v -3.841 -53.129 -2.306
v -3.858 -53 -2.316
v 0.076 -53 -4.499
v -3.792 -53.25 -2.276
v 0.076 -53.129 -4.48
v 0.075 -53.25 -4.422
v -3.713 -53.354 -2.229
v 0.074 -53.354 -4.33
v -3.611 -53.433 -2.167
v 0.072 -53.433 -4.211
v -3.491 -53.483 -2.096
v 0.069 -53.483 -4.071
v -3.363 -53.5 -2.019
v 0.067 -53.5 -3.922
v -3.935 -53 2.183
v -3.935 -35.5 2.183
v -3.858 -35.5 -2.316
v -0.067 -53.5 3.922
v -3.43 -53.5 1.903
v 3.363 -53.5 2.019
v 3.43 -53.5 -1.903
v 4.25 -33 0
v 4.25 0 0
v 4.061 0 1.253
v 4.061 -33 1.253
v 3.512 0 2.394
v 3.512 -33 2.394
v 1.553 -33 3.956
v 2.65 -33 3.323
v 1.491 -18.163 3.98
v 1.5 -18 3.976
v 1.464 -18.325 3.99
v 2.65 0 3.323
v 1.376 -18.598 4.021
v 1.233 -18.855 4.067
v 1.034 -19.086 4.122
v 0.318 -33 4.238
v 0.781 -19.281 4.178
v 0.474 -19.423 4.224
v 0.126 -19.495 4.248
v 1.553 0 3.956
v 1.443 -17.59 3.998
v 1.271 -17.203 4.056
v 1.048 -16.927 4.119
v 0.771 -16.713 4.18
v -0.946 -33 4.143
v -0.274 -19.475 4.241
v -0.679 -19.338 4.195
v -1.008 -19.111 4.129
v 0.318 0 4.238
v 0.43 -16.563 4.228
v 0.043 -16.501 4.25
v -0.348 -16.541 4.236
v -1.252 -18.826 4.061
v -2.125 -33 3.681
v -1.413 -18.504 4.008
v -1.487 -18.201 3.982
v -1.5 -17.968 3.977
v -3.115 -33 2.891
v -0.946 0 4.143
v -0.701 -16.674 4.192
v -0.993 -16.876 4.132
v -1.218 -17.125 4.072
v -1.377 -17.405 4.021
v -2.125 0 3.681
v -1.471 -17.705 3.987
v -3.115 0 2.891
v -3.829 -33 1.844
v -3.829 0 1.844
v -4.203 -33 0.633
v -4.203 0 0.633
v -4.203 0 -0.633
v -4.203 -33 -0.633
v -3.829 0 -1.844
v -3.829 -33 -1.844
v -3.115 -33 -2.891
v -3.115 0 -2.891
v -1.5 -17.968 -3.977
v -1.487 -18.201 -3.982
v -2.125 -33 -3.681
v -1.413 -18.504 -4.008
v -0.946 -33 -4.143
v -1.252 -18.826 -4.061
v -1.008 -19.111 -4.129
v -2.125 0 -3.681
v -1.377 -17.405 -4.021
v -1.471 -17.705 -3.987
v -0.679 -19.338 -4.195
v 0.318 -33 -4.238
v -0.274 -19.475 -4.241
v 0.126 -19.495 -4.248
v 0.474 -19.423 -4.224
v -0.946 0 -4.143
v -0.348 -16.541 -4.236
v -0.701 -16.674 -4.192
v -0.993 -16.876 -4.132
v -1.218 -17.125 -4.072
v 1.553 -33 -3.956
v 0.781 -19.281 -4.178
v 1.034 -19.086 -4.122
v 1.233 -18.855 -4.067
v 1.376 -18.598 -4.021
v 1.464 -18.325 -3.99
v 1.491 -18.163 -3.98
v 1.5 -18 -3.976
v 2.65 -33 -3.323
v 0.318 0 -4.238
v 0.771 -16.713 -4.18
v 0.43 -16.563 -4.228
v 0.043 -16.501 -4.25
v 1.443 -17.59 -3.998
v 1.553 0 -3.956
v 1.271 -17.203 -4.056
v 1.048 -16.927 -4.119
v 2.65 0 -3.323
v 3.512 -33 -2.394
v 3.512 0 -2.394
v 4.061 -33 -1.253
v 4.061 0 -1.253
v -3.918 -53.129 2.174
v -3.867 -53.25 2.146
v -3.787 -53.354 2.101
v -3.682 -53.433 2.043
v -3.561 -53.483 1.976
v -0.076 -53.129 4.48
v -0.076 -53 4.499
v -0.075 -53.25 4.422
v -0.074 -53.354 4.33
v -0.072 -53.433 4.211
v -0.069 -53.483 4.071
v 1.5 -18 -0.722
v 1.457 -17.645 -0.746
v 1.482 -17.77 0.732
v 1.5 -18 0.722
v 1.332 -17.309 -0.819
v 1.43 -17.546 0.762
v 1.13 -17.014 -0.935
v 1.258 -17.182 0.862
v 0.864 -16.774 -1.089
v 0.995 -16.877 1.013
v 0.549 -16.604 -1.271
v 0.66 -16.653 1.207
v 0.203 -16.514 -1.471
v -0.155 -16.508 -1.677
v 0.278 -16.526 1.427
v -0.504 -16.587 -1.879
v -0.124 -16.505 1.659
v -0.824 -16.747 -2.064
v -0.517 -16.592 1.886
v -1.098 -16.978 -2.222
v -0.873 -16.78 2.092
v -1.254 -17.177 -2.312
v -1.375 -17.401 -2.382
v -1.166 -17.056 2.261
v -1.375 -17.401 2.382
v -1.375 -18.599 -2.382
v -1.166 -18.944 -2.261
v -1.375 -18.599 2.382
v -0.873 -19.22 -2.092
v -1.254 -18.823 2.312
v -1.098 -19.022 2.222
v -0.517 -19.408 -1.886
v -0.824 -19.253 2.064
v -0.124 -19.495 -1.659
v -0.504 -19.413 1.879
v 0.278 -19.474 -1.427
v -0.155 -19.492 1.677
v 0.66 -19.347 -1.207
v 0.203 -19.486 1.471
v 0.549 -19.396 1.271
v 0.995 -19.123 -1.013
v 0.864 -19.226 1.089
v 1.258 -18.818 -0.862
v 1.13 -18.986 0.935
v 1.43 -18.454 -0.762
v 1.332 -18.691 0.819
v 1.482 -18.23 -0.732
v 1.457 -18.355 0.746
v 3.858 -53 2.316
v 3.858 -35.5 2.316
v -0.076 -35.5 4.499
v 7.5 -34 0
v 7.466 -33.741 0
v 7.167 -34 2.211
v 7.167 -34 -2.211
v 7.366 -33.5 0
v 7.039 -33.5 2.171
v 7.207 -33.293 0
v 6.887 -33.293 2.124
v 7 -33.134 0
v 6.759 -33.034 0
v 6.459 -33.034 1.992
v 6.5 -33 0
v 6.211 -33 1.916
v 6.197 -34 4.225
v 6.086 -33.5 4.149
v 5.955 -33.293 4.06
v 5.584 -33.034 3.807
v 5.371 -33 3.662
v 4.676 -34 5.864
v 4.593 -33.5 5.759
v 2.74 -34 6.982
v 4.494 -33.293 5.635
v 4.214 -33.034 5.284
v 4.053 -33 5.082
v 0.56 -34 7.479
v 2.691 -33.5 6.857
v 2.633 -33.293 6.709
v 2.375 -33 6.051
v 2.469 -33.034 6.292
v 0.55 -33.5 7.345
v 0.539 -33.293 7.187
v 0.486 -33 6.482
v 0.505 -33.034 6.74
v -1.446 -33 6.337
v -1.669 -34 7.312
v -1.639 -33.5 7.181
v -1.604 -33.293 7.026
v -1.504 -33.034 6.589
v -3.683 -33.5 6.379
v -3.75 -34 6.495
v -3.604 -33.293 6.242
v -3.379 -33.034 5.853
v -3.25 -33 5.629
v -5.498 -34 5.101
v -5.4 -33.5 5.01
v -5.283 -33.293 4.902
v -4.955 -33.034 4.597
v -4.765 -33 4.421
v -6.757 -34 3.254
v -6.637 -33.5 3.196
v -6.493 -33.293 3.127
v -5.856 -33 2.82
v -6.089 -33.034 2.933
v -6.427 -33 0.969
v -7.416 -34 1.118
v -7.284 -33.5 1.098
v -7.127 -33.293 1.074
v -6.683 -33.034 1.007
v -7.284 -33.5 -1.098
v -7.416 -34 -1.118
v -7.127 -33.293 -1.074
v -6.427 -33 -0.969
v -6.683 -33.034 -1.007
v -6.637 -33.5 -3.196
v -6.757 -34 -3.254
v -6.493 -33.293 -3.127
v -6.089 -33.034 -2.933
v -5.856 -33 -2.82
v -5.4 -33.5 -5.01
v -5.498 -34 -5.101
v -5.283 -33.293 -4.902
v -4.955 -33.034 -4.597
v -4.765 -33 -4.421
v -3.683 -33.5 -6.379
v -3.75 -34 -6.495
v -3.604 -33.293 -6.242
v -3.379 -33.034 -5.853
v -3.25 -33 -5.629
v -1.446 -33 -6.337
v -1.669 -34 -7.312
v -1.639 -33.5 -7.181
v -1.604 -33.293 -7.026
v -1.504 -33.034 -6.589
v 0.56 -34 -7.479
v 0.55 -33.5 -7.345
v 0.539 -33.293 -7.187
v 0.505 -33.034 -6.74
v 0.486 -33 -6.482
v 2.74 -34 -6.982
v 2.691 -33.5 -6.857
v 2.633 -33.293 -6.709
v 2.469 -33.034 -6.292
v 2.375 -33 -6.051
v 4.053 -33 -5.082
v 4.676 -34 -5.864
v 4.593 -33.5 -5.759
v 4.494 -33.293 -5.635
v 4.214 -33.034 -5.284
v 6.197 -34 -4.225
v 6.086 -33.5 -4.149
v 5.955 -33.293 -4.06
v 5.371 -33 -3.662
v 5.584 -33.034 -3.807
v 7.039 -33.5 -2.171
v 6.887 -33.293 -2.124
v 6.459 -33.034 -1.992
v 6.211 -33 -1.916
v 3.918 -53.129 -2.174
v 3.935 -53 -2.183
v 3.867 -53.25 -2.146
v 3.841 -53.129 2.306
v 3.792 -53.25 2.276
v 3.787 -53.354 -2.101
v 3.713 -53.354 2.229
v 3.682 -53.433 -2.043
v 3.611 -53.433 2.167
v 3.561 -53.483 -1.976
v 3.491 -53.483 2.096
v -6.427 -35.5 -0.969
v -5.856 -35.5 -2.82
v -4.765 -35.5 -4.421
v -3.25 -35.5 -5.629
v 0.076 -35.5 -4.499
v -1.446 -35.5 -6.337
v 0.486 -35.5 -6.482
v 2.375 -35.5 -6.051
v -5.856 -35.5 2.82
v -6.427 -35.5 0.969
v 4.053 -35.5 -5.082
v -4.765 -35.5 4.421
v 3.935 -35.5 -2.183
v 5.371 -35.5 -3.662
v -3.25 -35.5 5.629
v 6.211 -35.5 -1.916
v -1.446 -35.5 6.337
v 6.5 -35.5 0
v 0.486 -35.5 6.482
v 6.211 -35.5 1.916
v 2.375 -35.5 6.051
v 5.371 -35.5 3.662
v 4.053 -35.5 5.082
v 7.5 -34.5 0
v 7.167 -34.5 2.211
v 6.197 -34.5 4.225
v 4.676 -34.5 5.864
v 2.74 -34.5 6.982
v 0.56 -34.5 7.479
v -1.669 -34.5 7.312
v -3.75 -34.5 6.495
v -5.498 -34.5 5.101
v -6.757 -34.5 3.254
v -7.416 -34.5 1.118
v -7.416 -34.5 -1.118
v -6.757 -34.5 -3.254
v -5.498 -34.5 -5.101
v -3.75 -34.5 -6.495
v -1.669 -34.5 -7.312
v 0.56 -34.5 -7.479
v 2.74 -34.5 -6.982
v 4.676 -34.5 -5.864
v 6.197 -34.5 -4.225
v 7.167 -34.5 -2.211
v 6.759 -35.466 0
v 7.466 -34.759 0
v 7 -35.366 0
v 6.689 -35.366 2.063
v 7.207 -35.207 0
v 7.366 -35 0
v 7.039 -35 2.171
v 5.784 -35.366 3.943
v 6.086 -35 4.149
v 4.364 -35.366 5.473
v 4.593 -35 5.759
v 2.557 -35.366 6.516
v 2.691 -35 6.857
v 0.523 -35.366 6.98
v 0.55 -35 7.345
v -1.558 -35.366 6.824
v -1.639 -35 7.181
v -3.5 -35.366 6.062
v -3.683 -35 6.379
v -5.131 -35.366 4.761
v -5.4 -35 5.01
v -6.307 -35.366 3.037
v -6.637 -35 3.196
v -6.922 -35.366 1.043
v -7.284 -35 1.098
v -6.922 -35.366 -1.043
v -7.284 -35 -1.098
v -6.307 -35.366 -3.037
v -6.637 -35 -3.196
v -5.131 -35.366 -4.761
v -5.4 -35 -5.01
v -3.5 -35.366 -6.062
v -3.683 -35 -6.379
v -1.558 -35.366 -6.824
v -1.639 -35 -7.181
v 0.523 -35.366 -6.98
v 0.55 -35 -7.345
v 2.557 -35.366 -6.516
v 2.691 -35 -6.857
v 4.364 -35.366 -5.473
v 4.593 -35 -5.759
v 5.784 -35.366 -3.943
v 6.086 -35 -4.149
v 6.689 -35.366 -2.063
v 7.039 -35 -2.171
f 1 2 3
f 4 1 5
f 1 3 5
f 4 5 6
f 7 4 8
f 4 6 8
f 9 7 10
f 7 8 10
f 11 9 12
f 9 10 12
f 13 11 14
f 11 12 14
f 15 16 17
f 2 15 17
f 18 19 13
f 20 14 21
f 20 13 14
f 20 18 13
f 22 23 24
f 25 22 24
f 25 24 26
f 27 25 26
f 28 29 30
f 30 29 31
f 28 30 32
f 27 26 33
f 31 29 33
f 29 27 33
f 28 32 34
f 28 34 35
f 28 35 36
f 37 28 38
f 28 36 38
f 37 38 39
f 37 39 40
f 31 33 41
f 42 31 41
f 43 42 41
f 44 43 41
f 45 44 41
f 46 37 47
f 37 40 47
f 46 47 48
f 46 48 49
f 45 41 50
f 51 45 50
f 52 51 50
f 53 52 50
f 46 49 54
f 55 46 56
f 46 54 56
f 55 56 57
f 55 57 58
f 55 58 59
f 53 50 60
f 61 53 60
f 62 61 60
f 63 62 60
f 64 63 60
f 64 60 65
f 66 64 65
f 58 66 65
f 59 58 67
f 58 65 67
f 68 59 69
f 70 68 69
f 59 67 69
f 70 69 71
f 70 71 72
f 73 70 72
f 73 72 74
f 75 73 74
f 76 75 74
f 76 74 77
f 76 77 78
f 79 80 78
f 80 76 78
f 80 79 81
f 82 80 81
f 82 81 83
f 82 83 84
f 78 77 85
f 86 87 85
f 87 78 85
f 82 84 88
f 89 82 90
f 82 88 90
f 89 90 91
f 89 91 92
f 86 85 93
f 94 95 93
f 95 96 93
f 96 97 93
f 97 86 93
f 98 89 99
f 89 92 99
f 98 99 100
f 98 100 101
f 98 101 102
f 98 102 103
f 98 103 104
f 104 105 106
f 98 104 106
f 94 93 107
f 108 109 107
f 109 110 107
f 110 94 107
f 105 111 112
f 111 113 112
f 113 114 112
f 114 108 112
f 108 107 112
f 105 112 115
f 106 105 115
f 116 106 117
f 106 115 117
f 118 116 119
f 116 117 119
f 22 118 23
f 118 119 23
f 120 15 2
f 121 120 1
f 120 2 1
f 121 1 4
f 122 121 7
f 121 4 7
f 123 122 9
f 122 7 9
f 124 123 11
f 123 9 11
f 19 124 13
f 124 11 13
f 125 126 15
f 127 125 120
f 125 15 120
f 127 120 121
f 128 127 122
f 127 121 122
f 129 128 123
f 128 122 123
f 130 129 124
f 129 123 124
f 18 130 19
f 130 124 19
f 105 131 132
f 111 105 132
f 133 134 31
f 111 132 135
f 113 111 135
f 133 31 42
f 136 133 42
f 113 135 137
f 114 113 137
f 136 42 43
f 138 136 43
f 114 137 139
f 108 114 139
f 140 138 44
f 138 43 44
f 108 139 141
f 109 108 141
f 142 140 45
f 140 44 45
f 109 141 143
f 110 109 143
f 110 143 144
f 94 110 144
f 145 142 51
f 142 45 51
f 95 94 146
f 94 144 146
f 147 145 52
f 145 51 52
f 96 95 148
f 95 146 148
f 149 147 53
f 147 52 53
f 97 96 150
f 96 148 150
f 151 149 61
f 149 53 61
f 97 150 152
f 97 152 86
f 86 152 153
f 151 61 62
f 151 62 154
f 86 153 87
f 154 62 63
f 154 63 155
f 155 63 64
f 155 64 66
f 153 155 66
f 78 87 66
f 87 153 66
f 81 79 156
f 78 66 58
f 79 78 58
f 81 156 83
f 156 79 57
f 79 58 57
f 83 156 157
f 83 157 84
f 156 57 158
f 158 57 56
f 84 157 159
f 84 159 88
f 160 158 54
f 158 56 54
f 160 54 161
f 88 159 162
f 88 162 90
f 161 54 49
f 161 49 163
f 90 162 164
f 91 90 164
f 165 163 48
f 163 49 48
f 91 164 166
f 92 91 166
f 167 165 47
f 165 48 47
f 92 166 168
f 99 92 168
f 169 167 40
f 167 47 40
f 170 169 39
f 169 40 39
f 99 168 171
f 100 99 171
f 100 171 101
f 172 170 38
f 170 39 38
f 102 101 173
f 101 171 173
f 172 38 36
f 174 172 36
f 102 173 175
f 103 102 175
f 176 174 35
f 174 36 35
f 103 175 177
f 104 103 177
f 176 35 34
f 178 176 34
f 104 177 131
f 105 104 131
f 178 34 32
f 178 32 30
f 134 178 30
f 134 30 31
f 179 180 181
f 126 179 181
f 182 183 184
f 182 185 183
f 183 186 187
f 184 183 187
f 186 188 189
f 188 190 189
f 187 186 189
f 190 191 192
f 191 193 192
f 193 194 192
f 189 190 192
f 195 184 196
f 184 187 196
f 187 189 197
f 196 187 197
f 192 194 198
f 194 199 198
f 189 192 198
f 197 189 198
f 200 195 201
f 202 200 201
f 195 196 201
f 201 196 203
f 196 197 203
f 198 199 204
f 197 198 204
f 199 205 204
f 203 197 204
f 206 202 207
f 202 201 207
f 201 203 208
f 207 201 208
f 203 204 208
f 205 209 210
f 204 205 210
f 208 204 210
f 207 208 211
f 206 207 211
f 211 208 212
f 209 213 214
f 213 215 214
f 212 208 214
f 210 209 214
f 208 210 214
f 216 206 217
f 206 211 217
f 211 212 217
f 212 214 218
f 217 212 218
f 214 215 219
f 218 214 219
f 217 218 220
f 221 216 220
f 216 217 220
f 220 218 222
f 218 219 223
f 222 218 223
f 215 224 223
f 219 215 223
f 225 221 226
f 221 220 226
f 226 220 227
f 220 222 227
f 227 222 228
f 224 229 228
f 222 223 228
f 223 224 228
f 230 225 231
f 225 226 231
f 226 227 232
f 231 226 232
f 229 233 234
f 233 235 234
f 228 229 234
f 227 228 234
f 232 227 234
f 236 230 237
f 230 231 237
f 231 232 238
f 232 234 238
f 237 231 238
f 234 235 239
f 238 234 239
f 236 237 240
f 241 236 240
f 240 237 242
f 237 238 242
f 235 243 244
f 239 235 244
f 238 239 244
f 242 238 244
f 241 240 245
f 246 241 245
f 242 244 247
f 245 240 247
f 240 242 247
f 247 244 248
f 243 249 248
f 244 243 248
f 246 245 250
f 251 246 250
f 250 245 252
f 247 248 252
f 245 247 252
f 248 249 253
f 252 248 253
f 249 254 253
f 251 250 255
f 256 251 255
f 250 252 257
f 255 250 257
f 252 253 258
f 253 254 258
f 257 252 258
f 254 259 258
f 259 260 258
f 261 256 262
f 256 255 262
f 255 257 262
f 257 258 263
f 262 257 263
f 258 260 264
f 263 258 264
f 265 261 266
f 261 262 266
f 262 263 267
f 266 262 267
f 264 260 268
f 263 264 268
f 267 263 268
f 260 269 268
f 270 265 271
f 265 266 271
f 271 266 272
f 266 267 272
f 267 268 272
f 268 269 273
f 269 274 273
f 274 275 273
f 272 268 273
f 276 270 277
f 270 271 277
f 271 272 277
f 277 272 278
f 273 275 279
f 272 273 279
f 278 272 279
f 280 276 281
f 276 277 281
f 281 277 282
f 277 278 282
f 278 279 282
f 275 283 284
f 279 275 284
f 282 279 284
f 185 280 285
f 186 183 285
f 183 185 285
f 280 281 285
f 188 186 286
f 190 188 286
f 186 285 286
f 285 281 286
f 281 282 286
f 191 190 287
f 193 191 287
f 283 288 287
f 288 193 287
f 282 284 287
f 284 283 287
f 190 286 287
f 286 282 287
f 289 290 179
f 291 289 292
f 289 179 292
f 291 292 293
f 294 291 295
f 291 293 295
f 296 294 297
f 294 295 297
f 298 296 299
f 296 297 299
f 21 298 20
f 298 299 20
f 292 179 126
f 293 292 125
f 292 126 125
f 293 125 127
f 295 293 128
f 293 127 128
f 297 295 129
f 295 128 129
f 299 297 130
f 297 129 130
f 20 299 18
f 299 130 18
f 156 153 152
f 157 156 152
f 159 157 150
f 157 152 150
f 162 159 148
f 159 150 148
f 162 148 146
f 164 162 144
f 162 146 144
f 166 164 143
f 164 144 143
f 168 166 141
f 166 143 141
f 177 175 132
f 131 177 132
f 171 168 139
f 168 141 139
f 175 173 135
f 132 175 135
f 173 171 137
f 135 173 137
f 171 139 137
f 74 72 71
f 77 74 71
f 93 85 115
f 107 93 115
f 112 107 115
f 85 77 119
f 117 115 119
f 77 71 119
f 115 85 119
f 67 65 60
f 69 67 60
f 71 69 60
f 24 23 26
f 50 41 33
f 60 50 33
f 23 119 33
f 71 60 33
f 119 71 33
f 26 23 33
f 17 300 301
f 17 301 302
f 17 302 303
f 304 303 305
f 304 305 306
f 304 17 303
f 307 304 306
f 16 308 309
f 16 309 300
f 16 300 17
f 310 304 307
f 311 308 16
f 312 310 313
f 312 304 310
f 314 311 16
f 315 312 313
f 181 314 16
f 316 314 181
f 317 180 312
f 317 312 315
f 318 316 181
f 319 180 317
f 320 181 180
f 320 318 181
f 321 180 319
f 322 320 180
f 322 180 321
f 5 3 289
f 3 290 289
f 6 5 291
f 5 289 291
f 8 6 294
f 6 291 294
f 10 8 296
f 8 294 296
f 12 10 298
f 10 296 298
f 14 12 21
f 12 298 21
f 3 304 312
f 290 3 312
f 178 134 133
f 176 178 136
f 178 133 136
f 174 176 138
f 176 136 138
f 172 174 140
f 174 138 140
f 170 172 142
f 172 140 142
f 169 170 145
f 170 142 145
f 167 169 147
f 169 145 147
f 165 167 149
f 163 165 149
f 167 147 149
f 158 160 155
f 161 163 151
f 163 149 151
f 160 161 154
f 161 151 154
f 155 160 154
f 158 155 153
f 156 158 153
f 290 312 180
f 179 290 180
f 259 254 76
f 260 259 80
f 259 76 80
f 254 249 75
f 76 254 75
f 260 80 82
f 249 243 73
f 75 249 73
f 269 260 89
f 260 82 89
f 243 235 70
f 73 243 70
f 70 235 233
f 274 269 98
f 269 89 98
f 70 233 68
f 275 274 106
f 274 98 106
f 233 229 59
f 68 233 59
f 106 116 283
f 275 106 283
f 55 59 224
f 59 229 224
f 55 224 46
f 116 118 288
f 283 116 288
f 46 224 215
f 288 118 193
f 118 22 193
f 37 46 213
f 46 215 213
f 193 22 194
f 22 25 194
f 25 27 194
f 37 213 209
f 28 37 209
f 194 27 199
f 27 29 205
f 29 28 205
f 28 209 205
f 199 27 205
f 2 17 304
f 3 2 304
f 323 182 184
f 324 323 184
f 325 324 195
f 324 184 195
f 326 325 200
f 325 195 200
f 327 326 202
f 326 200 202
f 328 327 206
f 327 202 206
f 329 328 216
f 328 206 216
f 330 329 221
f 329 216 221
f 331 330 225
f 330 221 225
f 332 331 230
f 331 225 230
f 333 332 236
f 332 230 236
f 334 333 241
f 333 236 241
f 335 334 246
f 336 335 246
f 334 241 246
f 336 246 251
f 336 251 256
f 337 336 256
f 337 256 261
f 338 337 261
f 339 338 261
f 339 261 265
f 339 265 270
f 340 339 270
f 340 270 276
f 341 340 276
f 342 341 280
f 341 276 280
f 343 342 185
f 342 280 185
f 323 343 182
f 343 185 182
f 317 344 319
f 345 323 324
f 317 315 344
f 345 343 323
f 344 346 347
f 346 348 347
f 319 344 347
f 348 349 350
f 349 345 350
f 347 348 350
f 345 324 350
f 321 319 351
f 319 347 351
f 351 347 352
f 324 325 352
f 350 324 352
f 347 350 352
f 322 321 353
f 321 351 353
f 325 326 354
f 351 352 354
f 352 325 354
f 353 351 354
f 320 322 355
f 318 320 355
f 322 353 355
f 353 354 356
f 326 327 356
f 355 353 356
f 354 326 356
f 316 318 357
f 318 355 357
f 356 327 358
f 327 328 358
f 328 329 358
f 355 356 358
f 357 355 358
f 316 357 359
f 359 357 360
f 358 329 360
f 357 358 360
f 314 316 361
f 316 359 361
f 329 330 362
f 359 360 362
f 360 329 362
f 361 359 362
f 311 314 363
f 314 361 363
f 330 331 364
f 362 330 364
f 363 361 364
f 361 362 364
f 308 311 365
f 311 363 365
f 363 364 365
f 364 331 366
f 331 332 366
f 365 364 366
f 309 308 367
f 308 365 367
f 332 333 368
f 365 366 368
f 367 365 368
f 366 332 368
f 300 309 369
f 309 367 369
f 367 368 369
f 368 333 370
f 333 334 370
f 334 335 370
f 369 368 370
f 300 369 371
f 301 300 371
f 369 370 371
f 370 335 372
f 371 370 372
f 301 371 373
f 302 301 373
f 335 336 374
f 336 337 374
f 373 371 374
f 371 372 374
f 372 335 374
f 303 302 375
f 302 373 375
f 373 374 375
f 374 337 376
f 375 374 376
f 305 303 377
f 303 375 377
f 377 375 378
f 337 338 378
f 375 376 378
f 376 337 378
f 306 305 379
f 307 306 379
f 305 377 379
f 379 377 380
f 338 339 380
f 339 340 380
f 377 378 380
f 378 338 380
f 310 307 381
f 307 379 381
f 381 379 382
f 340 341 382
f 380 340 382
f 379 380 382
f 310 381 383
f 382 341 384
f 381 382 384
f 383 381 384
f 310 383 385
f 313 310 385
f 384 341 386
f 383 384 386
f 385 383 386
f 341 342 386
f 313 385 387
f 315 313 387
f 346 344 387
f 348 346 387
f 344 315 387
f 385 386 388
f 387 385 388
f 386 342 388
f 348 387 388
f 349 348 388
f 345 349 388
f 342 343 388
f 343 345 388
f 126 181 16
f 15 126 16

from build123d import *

# Parameters (mm, degrees)
F0_R      = 4.25
F1_DEPTH  = 33
F2_DEPTH  = 6
F3_R      = 7.5
F3_R_2    = 4.25
F4_DEPTH  = 2.5
F6_DEPTH  = 18
F7_R      = 0.5
F8_R      = 1
F10_R     = 1.5
F11_DEPTH = 40
F12_DEPTH = 25


with BuildPart() as f1:
    # F0 (on Front) → F1 (new body)
    with BuildSketch(Plane.XZ):
        Circle(F0_R)
        Polygon((-1.375, 2.38157), (2.75, 0), (-1.375, -2.38157), align=None, mode=Mode.SUBTRACT)
        Polygon((-1.375, -2.38157), (2.75, 0), (-1.375, 2.38157), align=None)
    extrude(amount=F1_DEPTH)

    # F0 (on Front) → F2 (cut)
    with BuildSketch(Plane.XZ):
        Polygon((-1.375, -2.38157), (2.75, 0), (-1.375, 2.38157), align=None)
    extrude(amount=F2_DEPTH, mode=Mode.SUBTRACT)

    # F3 (on face) → F4 (join)
    with BuildSketch(Plane.XZ.offset(33)):
        Circle(F3_R)
        Circle(F3_R_2, mode=Mode.SUBTRACT)
        Circle(F3_R_2)
    extrude(amount=F4_DEPTH)

    # F5 (on face) → F6 (join)
    with BuildSketch(Plane.XZ.offset(35.5)):
        Polygon((0.076423, -4.499351), (3.934764, -2.183492), (3.858341, 2.315859), (-0.076423, 4.499351), (-3.934764, 2.183492), (-3.858341, -2.315859), align=None)
    extrude(amount=F6_DEPTH)

    # F7
    f7_edges = [f1.edges().sort_by_distance(p)[0] for p in [
        (2.005593, -53.5, -3.341421),
        (-1.890959, -53.5, -3.407605),
        (-3.896552, -53.5, -0.066184),
        (-2.005593, -53.5, 3.341421),
        (1.890959, -53.5, 3.407605),
        (3.896552, -53.5, 0.066184),
    ]]
    fillet(f7_edges, radius=F7_R)

    # F8
    f8_edges = [f1.edges().sort_by_distance(p)[0] for p in [
        (-7.5, -35.5, 0),
        (-7.5, -33, 0),
    ]]
    fillet(f8_edges, radius=F8_R)

    # F10 (on offset) → F11 (cut)
    with BuildSketch(Plane.XY.offset(25)):
        with Locations((0, -18)):
            Circle(F10_R)
    extrude(amount=-F11_DEPTH, mode=Mode.SUBTRACT)

    # F0 (on Front) → F12 (join)
    with BuildSketch(Plane.XZ):
        Polygon((-1.375, -2.38157), (2.75, 0), (-1.375, 2.38157), align=None)
    extrude(amount=F12_DEPTH)


solid = f1.part
